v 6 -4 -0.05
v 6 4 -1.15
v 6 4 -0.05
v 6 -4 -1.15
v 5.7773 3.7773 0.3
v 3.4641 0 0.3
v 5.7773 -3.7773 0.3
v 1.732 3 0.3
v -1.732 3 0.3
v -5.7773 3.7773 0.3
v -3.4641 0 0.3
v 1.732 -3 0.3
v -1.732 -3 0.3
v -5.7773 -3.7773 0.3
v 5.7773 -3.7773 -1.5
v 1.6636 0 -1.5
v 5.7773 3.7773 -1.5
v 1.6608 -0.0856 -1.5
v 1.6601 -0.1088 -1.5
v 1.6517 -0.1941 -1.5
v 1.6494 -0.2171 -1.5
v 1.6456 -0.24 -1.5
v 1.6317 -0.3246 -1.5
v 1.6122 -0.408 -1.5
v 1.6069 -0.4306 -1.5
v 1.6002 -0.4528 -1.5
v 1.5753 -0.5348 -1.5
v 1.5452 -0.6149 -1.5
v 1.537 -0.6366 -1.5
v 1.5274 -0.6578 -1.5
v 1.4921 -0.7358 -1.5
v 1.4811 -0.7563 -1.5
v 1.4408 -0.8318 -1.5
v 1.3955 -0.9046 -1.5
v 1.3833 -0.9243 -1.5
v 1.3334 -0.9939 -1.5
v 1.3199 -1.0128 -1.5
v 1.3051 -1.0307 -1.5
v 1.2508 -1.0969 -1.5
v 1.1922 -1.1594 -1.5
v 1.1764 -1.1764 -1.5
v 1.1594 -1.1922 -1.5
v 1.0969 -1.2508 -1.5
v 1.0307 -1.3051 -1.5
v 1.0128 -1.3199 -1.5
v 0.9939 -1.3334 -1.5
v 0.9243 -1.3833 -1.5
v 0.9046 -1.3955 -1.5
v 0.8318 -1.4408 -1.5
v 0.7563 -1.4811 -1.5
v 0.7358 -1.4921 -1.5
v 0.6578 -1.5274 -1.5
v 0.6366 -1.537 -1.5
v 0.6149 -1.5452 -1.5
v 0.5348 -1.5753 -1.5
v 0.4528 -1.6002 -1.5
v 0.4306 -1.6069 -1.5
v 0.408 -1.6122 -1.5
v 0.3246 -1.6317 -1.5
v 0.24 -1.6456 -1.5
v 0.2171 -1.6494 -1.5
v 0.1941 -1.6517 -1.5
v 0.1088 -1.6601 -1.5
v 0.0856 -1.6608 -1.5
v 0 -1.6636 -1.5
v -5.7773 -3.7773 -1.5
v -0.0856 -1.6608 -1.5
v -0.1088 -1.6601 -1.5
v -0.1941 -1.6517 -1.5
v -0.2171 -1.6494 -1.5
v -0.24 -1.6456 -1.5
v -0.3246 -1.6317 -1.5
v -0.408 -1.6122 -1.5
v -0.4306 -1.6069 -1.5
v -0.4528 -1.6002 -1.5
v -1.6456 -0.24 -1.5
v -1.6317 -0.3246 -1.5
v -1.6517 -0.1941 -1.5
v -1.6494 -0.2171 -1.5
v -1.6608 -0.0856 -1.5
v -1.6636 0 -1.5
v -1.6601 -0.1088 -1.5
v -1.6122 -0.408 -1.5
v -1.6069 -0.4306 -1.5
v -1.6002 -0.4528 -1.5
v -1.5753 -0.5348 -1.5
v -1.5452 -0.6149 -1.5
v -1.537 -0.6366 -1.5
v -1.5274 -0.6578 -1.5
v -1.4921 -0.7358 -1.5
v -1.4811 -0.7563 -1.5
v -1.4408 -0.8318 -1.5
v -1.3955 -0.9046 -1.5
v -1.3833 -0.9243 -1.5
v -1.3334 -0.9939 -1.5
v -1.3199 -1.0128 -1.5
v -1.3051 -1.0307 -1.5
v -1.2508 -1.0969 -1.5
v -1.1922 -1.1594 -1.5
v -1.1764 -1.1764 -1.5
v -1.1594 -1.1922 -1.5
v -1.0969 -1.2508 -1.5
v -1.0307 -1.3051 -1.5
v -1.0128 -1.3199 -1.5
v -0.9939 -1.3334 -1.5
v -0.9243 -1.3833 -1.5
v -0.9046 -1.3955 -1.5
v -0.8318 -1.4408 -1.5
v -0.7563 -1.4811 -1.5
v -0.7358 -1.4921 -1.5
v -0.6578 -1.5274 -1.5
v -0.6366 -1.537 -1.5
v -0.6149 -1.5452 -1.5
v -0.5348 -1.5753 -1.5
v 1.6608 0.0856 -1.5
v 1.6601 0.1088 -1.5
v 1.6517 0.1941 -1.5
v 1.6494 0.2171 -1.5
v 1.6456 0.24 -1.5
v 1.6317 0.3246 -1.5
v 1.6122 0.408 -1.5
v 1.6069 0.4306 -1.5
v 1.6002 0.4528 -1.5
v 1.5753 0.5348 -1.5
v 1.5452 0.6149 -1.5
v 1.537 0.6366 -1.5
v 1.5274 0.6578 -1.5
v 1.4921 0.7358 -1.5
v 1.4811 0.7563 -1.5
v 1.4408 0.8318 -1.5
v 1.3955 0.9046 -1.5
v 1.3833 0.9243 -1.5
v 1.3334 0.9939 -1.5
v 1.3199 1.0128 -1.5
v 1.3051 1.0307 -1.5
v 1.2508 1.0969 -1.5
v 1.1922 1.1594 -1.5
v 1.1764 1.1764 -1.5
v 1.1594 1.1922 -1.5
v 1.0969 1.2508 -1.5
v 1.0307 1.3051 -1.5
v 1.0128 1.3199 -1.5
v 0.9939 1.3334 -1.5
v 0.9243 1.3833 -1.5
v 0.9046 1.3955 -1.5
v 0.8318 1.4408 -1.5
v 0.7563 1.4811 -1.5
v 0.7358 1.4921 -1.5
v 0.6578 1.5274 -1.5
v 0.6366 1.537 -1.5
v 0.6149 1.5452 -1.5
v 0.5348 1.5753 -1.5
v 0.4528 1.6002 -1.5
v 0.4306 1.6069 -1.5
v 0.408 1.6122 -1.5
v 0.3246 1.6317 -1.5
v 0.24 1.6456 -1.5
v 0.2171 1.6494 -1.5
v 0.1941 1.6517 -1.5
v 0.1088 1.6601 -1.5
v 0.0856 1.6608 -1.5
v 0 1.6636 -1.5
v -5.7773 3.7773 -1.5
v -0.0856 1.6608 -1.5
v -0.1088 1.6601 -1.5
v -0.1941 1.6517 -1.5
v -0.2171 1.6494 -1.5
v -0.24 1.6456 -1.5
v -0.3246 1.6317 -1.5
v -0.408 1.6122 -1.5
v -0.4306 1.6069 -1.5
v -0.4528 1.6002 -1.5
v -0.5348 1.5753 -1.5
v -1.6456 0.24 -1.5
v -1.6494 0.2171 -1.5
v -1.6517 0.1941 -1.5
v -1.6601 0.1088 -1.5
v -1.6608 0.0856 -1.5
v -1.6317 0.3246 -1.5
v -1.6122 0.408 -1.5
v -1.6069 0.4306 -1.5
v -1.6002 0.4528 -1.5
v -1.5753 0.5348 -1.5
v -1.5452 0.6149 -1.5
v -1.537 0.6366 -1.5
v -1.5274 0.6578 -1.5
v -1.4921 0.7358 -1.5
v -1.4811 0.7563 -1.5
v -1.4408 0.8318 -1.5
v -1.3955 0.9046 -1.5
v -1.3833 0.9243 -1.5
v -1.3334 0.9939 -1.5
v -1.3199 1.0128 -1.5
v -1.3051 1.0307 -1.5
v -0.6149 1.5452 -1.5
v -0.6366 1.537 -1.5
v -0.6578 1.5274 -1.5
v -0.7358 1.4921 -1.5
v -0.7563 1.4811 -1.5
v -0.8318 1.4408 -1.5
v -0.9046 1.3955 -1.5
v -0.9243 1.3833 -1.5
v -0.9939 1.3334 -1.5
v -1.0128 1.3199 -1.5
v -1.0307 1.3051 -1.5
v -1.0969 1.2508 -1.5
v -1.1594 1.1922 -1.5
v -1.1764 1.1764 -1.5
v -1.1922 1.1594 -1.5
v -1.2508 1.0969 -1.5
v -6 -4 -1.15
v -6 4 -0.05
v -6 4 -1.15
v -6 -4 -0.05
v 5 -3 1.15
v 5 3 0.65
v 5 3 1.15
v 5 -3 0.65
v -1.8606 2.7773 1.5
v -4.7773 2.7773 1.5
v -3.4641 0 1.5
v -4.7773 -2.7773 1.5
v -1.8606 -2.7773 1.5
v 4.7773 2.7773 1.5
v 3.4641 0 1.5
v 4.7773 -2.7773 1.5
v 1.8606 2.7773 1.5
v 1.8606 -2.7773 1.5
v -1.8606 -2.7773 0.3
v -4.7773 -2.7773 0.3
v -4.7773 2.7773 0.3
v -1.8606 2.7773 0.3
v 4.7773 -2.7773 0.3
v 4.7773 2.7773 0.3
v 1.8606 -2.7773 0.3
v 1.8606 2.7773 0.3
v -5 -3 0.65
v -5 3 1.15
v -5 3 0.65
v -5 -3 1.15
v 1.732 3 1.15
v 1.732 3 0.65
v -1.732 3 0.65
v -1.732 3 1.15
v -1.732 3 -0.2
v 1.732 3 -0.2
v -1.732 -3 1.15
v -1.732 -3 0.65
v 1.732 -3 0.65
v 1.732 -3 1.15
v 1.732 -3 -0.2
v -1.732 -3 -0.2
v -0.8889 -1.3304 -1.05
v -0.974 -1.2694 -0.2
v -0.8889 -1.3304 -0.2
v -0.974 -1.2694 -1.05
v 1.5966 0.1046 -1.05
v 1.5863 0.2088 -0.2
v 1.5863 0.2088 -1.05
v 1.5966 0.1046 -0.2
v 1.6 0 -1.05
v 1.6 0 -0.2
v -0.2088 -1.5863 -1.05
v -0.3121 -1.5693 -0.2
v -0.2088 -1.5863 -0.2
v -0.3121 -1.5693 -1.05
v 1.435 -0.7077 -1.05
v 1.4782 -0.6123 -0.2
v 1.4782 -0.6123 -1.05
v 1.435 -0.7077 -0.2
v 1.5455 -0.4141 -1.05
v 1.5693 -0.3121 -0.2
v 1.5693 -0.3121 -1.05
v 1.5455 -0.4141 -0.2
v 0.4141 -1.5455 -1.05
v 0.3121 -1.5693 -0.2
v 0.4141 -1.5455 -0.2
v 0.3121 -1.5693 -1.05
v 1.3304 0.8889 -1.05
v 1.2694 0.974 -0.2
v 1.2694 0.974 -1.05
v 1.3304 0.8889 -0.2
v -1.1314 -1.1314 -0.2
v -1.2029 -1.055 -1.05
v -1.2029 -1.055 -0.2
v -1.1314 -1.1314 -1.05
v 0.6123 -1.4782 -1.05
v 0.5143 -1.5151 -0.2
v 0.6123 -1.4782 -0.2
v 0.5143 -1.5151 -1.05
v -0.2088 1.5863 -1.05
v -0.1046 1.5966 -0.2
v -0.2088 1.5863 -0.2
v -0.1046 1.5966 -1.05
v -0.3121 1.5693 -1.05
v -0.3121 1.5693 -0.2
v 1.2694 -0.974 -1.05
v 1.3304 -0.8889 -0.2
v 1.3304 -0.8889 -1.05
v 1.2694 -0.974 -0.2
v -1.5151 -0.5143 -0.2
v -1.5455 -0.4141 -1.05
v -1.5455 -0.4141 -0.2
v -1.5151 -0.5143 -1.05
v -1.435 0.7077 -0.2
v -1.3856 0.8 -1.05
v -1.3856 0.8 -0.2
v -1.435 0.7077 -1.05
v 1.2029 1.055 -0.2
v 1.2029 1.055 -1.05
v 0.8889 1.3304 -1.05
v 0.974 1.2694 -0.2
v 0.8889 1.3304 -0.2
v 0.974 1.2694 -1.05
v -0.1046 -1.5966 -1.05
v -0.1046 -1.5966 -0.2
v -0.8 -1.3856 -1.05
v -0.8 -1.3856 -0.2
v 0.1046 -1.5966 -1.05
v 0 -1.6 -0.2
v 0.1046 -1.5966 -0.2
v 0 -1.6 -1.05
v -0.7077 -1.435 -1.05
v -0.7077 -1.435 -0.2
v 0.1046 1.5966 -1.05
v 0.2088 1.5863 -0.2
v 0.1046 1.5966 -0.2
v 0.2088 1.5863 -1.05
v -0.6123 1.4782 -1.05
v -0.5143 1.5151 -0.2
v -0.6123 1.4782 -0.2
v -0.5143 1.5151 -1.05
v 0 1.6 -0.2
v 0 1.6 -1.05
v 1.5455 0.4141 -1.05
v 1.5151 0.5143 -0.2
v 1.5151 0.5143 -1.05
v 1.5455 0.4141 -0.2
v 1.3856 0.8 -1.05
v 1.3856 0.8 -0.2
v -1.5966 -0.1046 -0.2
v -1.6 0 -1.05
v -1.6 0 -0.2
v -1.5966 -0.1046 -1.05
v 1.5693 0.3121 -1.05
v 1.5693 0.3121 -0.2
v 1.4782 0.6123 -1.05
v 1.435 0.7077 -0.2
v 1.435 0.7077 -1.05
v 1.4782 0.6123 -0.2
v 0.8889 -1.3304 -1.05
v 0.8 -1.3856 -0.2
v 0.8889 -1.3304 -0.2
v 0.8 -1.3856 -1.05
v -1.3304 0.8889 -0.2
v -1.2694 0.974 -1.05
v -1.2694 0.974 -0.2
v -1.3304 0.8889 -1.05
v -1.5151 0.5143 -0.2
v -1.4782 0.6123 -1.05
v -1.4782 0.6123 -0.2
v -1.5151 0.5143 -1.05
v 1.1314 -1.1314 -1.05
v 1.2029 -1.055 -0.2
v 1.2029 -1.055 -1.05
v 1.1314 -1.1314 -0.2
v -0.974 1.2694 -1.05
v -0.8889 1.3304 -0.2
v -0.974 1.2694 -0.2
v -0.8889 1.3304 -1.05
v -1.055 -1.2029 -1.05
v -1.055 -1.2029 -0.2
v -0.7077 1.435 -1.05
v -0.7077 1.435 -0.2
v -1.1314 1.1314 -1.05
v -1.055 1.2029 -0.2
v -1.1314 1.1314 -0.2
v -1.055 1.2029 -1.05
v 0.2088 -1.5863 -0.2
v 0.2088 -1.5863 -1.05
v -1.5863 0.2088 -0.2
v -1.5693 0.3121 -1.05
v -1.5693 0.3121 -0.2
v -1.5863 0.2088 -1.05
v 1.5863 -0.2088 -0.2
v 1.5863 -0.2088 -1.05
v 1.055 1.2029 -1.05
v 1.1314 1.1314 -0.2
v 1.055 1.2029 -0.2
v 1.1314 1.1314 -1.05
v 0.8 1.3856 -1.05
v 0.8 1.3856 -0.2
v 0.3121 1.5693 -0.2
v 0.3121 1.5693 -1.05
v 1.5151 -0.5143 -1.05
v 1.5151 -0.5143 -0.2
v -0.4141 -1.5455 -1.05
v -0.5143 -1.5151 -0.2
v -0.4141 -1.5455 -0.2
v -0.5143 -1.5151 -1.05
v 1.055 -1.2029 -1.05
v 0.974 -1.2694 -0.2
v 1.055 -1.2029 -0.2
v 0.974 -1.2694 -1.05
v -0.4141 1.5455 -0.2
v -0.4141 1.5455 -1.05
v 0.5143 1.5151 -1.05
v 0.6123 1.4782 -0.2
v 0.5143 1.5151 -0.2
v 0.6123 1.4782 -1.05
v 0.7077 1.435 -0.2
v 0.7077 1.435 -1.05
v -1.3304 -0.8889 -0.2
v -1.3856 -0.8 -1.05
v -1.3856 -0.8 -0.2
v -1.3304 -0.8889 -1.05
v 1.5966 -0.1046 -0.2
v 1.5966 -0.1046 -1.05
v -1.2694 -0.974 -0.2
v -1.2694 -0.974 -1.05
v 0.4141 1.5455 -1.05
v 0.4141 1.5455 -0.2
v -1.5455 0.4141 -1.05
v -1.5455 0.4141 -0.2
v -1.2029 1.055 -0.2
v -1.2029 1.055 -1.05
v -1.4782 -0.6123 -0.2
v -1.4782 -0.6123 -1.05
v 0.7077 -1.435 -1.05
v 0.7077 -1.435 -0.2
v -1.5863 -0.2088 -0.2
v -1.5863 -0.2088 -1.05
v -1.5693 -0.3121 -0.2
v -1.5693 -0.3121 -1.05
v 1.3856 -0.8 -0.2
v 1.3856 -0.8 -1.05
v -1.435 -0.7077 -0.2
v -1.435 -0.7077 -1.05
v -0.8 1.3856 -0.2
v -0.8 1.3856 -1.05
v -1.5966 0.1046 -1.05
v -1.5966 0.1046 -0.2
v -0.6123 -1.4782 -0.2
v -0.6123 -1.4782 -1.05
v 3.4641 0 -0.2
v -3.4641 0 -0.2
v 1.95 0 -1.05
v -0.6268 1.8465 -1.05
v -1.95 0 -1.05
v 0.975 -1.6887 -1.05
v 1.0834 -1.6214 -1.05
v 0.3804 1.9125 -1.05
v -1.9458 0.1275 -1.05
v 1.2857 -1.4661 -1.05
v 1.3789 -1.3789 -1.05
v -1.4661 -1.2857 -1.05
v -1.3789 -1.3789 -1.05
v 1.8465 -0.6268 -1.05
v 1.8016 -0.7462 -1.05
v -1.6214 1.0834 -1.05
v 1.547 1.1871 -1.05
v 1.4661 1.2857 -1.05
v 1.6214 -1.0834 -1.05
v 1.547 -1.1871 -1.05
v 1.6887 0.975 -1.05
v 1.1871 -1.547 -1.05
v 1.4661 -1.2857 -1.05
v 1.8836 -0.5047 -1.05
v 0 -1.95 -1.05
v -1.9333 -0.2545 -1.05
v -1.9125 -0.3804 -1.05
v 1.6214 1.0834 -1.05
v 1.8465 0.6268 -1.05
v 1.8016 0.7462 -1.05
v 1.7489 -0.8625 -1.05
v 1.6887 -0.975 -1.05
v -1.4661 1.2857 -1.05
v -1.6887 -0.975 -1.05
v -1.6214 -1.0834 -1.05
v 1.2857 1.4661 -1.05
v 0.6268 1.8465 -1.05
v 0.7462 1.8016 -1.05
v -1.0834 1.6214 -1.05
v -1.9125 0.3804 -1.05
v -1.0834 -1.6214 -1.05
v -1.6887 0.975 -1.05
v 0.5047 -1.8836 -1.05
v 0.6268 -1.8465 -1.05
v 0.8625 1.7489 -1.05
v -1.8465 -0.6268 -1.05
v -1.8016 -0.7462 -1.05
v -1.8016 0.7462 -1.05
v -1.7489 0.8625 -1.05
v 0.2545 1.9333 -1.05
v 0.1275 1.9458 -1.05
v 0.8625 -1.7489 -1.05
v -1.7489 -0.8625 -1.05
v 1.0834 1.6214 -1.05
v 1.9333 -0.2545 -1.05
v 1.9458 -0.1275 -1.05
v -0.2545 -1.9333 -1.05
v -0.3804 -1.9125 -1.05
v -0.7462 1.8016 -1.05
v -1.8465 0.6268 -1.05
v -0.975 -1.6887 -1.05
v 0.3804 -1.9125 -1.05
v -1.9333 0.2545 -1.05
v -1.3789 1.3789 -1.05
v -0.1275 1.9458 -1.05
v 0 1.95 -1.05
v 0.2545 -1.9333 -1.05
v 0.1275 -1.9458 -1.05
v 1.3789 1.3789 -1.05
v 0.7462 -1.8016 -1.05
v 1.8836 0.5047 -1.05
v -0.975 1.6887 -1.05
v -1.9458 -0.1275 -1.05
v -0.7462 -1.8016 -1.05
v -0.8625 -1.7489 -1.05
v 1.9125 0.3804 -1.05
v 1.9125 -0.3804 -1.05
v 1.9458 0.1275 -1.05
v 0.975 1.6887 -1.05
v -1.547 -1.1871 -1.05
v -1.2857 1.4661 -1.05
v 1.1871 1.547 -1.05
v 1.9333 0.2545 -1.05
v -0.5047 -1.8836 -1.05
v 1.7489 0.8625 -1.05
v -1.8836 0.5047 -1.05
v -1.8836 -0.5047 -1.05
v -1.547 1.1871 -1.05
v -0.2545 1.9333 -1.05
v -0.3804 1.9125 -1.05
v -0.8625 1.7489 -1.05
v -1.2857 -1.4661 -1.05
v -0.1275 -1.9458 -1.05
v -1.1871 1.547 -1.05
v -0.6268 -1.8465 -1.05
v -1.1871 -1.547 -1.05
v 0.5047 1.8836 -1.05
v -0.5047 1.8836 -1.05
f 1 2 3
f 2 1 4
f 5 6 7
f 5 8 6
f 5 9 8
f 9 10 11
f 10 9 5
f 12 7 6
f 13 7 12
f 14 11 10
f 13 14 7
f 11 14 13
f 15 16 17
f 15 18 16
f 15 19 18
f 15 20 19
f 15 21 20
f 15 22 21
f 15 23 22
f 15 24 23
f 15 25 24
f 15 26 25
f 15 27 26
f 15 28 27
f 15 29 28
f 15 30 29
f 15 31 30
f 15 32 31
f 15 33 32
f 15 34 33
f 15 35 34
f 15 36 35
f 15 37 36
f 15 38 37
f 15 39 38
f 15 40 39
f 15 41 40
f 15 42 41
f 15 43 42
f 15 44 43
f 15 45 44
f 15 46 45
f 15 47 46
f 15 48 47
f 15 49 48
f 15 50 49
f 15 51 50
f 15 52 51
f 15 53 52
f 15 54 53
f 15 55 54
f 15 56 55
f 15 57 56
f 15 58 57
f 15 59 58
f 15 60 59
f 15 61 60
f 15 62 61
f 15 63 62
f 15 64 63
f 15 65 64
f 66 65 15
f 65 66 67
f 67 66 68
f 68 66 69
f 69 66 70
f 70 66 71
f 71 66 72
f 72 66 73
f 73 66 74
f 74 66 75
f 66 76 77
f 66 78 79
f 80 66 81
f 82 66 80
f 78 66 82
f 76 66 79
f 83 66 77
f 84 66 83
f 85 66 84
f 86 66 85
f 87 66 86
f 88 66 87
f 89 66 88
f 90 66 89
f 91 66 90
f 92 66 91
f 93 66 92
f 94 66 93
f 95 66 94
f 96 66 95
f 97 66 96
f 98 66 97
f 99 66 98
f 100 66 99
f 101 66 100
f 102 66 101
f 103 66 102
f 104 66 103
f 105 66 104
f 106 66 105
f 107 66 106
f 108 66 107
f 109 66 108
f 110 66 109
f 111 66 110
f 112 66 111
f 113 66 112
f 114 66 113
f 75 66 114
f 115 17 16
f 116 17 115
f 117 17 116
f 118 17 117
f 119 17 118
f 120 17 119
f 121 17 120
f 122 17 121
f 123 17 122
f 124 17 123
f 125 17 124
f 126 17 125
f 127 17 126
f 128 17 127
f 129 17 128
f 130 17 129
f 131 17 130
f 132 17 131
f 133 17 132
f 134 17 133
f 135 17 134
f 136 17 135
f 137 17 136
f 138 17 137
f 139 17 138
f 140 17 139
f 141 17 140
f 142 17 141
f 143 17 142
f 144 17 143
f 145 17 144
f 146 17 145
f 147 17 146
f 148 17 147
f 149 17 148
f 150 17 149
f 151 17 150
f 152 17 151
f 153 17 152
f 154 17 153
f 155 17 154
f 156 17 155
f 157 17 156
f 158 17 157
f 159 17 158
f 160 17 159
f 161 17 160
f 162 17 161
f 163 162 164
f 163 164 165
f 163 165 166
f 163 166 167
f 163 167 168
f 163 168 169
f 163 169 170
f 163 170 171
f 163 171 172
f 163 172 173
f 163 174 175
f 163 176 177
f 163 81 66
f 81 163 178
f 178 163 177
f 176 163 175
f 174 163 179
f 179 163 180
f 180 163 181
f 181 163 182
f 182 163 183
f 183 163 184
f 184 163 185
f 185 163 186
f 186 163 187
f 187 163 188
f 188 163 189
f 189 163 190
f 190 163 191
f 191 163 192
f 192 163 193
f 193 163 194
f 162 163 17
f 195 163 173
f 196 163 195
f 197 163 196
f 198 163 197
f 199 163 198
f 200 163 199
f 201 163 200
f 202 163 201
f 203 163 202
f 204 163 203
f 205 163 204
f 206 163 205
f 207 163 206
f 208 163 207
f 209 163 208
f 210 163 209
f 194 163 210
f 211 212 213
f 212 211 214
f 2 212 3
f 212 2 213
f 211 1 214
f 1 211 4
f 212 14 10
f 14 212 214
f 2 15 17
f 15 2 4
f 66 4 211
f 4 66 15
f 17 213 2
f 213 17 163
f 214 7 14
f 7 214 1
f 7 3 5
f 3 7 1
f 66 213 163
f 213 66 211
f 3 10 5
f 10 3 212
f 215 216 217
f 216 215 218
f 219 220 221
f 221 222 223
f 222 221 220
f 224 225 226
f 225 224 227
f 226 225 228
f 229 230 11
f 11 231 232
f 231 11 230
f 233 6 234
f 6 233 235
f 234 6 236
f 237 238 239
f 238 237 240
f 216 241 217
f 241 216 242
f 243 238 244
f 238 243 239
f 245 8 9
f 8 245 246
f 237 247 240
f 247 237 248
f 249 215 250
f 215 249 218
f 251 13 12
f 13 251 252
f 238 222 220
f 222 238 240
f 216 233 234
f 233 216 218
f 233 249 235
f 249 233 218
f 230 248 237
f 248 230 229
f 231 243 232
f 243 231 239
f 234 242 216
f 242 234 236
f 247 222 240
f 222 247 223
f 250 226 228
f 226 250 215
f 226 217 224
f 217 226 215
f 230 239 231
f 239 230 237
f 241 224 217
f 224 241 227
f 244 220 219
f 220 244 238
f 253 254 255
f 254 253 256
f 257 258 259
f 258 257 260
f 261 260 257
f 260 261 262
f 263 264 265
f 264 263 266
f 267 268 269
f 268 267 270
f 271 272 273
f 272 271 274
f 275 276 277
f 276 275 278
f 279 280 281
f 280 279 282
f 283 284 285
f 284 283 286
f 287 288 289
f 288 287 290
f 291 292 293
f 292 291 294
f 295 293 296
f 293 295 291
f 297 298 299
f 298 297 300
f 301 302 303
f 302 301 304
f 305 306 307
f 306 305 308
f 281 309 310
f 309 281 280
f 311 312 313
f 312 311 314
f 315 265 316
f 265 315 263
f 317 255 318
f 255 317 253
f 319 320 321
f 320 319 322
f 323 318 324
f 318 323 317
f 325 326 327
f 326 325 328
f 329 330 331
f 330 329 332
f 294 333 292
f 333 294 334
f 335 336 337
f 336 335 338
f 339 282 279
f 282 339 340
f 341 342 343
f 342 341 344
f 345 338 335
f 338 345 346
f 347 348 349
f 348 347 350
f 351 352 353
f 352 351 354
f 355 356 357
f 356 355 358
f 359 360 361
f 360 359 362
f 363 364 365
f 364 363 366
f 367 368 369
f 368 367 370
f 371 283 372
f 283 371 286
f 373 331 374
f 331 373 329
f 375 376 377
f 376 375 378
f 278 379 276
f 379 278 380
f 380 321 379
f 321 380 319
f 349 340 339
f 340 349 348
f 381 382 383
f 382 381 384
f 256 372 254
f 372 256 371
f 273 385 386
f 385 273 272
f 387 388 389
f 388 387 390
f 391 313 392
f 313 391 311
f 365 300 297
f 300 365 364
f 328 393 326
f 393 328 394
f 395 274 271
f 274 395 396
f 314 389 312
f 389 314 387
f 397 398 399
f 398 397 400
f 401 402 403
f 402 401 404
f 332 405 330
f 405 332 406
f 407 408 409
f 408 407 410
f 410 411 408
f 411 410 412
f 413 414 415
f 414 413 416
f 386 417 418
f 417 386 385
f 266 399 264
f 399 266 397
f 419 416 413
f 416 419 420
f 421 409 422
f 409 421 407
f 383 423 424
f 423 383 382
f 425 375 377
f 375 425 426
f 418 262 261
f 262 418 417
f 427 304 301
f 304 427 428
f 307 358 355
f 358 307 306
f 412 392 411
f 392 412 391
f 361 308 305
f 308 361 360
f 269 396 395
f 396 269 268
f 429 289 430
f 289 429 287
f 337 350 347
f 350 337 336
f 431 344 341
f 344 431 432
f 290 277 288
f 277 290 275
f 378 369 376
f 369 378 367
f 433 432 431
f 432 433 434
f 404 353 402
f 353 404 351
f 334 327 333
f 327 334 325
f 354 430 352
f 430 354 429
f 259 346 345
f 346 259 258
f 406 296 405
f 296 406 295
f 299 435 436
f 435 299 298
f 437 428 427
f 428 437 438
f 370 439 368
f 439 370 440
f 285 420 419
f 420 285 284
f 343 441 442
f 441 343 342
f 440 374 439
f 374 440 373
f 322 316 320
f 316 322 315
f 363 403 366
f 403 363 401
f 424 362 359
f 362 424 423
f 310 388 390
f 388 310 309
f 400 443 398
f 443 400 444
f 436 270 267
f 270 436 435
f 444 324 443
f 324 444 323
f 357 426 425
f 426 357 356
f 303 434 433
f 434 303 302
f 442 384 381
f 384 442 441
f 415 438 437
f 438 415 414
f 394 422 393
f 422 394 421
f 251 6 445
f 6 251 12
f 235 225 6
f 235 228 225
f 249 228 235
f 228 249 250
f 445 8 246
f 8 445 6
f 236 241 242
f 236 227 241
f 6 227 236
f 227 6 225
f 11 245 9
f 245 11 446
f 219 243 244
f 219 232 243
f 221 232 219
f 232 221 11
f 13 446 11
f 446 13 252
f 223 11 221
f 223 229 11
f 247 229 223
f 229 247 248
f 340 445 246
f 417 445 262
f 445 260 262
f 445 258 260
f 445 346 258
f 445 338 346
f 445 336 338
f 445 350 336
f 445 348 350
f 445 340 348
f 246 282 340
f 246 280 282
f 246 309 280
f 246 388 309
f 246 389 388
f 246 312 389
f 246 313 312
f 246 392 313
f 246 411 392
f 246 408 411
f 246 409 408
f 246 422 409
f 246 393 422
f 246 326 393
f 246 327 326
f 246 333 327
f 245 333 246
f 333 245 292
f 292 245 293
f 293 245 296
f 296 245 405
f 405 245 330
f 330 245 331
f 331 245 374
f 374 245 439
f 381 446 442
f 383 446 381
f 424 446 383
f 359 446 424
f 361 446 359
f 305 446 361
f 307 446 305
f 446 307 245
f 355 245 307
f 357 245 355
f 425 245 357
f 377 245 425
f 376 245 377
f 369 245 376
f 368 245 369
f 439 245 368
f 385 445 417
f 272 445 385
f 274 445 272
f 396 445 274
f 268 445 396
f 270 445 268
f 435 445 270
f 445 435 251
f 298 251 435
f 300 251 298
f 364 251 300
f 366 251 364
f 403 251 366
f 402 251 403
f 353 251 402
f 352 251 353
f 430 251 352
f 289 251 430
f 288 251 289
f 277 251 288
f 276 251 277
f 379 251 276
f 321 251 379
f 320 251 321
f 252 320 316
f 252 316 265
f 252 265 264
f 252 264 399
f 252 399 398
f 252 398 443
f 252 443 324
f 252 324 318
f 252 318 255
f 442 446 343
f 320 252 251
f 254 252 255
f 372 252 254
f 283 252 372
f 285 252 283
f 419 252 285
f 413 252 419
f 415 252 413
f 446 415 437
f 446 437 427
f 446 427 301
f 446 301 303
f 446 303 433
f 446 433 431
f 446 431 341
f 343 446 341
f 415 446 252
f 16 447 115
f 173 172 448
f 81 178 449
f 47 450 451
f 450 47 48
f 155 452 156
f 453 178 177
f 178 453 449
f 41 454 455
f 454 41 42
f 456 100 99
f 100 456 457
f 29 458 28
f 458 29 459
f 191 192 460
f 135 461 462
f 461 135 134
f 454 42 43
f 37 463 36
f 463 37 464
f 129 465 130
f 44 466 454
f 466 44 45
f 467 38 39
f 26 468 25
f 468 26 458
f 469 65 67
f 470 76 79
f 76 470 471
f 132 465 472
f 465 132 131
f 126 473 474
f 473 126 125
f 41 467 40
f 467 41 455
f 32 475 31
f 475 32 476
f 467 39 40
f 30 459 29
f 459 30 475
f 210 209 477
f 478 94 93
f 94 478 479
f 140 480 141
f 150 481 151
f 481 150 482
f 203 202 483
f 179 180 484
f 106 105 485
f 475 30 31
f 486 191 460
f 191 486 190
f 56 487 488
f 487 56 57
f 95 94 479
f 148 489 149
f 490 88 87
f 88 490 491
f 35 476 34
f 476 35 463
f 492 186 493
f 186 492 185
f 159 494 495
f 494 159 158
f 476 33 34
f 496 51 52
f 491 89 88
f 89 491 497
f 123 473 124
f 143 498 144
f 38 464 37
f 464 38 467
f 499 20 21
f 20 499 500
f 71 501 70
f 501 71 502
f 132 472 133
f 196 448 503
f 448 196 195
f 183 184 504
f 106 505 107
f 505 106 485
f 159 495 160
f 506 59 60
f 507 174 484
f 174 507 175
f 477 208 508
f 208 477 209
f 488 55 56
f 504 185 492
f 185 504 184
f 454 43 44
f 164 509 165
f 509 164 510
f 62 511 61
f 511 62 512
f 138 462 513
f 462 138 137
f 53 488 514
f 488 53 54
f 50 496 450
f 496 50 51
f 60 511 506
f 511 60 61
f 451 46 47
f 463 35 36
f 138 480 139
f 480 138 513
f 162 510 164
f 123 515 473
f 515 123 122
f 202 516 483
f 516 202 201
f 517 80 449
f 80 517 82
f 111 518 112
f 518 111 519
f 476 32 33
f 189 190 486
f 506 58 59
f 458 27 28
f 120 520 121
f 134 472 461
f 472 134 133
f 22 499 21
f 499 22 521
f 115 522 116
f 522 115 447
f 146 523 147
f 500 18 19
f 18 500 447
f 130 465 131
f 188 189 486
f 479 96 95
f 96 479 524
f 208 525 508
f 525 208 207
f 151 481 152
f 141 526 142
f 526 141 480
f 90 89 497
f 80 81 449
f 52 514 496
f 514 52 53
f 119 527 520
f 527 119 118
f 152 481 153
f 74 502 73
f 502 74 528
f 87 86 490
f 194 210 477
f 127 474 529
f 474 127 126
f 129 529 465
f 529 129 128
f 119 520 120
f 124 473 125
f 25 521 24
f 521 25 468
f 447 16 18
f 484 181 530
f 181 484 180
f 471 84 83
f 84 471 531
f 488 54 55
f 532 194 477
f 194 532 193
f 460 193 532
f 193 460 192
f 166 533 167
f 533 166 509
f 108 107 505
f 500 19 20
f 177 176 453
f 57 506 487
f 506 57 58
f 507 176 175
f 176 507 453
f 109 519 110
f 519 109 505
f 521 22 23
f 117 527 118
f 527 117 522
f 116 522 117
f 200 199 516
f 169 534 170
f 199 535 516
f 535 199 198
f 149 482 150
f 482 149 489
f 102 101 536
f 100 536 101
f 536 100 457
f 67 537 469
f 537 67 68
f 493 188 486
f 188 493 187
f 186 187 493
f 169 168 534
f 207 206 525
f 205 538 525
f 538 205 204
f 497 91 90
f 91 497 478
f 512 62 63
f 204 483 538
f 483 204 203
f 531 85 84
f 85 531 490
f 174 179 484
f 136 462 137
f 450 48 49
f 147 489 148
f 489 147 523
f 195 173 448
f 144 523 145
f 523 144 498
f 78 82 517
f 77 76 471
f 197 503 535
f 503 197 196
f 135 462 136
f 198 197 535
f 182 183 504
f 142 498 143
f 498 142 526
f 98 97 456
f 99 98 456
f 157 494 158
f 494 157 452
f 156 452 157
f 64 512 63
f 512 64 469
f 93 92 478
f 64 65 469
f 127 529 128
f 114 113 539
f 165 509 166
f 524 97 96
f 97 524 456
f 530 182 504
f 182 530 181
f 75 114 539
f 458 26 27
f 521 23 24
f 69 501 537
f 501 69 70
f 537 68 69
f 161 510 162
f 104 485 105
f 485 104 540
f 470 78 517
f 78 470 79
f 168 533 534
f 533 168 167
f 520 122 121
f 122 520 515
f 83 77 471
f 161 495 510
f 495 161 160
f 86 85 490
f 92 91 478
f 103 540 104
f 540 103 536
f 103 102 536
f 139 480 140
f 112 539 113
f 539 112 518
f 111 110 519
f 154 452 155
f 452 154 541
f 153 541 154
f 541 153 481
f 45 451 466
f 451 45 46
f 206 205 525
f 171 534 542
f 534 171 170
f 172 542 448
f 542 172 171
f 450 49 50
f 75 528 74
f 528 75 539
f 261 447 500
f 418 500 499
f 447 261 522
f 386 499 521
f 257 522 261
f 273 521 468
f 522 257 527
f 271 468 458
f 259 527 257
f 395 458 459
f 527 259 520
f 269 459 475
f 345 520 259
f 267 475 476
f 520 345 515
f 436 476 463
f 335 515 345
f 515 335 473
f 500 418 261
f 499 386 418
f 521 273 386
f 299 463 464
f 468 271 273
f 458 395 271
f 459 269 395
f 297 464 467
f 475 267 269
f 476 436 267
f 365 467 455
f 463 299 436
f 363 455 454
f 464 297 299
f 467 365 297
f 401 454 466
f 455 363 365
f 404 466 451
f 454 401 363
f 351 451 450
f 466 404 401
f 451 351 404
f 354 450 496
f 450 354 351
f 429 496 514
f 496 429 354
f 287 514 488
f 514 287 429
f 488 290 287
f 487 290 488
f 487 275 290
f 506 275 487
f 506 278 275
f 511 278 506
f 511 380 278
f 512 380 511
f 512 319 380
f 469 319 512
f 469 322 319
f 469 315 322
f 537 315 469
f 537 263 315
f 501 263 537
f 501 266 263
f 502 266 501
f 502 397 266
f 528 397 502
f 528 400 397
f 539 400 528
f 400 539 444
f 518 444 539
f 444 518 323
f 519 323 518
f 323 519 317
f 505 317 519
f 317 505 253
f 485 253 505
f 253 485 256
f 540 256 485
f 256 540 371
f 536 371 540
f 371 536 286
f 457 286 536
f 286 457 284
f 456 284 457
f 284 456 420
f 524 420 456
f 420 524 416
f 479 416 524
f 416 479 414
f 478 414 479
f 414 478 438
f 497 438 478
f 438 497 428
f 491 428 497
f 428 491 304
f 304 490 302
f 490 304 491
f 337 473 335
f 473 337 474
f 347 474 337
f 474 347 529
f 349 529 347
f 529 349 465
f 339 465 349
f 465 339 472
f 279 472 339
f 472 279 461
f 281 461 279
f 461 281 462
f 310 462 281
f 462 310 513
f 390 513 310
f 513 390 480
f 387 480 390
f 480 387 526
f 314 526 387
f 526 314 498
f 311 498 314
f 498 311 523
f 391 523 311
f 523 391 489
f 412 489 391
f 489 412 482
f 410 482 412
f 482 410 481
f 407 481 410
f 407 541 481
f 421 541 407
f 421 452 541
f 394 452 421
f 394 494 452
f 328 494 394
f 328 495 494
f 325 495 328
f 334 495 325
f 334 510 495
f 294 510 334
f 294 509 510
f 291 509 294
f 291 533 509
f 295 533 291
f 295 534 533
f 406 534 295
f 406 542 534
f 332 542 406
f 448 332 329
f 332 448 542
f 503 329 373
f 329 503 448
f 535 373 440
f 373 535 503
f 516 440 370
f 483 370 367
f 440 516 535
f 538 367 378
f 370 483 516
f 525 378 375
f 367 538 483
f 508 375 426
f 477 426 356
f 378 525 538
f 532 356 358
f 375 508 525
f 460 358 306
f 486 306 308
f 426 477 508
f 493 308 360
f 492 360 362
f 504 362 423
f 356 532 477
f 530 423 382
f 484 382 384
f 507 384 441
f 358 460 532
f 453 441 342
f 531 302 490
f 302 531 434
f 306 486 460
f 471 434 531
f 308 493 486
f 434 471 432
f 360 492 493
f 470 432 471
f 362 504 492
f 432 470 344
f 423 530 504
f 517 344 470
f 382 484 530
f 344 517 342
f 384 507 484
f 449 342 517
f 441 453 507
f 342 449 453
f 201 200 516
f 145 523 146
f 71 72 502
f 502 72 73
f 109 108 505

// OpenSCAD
// T-slot nut for M3 screw
// Requirements: 3.0mm screw (clearance hole), 6.0mm across flats, 3.0mm thick
// Single connected solid (one part), no extra washer/hex stack.

$fn = 96;

// --- Core requirements ---
thickness = 3.0;                 // overall thickness (Z)
across_flats = 6.0;              // hex across flats (internal hex socket)
hole_clearance = 3.2;            // clearance for M3 (no threads modeled)

// --- T-slot nut profile (T-shape in plan view) ---
nut_overall_length = 12.0;       // along slot (X)

// Bottom "head" that captures under slot lips
head_width = 8.0;                // across slot (Y) at bottom
// Top "neck" that fits through slot opening
neck_width = 6.0;                // across slot (Y) at top

// Lengths (X) for head/neck (neck centered on head)
head_length = nut_overall_length;
neck_length = nut_overall_length - 2.0;  // slightly shorter to form shoulders

// Height split (Z): head + neck = thickness
neck_height = 1.2;
head_height = thickness - neck_height;

// Edge chamfer (small, for insertion)
edge_chamfer = 0.35;

// Overlap for robust booleans
overlap = 0.2;

// --- Helpers ---
function hex_circumradius_from_af(af) = af / (2 * cos(30)); // R such that across flats = af

module chamfered_block(size=[10,10,3], c=0.35) {
    if (c <= 0) {
        cube(size, center=true);
    } else {
        intersection() {
            cube(size, center=true);
            hull() {
                cube([max(0.01,size[0]-2*c), max(0.01,size[1]-2*c), size[2]+2*overlap], center=true);
                cube([size[0], size[1], max(0.01, size[2]-2*c)], center=true);
            }
        }
    }
}

module t_slot_nut() {
    difference() {
        union() {
            // Bottom head (wider) - centered at z = -thickness/2 + head_height/2
            translate([0, 0, -thickness/2 + head_height/2])
                chamfered_block([head_length, head_width, head_height], edge_chamfer);

            // Top neck (narrower) - connected, centered at z = +thickness/2 - neck_height/2
            translate([0, 0,  thickness/2 - neck_height/2])
                chamfered_block([neck_length, neck_width, neck_height], edge_chamfer);
        }

        // Through clearance hole for M3
        cylinder(r=hole_clearance/2, h=thickness + 2*overlap, center=true);

        // Internal hex socket (6mm across flats) for driving/holding (recessed from top)
        // Keep a bottom wall so the part remains one solid and thickness stays 3.0mm.
        hex_depth = min(1.6, thickness - 0.6);   // leaves >=0.6mm bottom wall
        bottom_wall = thickness - hex_depth;
        translate([0, 0, thickness/2 - hex_depth/2])
            cylinder(r=hex_circumradius_from_af(across_flats),
                     h=hex_depth + overlap,
                     center=true,
                     $fn=6);

        // Small lead-in chamfer for the clearance hole (both sides)
        hole_ch = 0.35;
        translate([0,0, thickness/2 - hole_ch/2])
            cylinder(r1=hole_clearance/2 + hole_ch,
                     r2=hole_clearance/2,
                     h=hole_ch + overlap,
                     center=true);
        translate([0,0,-thickness/2 + hole_ch/2])
            cylinder(r1=hole_clearance/2,
                     r2=hole_clearance/2 + hole_ch,
                     h=hole_ch + overlap,
                     center=true);
    }
}

t_slot_nut();
